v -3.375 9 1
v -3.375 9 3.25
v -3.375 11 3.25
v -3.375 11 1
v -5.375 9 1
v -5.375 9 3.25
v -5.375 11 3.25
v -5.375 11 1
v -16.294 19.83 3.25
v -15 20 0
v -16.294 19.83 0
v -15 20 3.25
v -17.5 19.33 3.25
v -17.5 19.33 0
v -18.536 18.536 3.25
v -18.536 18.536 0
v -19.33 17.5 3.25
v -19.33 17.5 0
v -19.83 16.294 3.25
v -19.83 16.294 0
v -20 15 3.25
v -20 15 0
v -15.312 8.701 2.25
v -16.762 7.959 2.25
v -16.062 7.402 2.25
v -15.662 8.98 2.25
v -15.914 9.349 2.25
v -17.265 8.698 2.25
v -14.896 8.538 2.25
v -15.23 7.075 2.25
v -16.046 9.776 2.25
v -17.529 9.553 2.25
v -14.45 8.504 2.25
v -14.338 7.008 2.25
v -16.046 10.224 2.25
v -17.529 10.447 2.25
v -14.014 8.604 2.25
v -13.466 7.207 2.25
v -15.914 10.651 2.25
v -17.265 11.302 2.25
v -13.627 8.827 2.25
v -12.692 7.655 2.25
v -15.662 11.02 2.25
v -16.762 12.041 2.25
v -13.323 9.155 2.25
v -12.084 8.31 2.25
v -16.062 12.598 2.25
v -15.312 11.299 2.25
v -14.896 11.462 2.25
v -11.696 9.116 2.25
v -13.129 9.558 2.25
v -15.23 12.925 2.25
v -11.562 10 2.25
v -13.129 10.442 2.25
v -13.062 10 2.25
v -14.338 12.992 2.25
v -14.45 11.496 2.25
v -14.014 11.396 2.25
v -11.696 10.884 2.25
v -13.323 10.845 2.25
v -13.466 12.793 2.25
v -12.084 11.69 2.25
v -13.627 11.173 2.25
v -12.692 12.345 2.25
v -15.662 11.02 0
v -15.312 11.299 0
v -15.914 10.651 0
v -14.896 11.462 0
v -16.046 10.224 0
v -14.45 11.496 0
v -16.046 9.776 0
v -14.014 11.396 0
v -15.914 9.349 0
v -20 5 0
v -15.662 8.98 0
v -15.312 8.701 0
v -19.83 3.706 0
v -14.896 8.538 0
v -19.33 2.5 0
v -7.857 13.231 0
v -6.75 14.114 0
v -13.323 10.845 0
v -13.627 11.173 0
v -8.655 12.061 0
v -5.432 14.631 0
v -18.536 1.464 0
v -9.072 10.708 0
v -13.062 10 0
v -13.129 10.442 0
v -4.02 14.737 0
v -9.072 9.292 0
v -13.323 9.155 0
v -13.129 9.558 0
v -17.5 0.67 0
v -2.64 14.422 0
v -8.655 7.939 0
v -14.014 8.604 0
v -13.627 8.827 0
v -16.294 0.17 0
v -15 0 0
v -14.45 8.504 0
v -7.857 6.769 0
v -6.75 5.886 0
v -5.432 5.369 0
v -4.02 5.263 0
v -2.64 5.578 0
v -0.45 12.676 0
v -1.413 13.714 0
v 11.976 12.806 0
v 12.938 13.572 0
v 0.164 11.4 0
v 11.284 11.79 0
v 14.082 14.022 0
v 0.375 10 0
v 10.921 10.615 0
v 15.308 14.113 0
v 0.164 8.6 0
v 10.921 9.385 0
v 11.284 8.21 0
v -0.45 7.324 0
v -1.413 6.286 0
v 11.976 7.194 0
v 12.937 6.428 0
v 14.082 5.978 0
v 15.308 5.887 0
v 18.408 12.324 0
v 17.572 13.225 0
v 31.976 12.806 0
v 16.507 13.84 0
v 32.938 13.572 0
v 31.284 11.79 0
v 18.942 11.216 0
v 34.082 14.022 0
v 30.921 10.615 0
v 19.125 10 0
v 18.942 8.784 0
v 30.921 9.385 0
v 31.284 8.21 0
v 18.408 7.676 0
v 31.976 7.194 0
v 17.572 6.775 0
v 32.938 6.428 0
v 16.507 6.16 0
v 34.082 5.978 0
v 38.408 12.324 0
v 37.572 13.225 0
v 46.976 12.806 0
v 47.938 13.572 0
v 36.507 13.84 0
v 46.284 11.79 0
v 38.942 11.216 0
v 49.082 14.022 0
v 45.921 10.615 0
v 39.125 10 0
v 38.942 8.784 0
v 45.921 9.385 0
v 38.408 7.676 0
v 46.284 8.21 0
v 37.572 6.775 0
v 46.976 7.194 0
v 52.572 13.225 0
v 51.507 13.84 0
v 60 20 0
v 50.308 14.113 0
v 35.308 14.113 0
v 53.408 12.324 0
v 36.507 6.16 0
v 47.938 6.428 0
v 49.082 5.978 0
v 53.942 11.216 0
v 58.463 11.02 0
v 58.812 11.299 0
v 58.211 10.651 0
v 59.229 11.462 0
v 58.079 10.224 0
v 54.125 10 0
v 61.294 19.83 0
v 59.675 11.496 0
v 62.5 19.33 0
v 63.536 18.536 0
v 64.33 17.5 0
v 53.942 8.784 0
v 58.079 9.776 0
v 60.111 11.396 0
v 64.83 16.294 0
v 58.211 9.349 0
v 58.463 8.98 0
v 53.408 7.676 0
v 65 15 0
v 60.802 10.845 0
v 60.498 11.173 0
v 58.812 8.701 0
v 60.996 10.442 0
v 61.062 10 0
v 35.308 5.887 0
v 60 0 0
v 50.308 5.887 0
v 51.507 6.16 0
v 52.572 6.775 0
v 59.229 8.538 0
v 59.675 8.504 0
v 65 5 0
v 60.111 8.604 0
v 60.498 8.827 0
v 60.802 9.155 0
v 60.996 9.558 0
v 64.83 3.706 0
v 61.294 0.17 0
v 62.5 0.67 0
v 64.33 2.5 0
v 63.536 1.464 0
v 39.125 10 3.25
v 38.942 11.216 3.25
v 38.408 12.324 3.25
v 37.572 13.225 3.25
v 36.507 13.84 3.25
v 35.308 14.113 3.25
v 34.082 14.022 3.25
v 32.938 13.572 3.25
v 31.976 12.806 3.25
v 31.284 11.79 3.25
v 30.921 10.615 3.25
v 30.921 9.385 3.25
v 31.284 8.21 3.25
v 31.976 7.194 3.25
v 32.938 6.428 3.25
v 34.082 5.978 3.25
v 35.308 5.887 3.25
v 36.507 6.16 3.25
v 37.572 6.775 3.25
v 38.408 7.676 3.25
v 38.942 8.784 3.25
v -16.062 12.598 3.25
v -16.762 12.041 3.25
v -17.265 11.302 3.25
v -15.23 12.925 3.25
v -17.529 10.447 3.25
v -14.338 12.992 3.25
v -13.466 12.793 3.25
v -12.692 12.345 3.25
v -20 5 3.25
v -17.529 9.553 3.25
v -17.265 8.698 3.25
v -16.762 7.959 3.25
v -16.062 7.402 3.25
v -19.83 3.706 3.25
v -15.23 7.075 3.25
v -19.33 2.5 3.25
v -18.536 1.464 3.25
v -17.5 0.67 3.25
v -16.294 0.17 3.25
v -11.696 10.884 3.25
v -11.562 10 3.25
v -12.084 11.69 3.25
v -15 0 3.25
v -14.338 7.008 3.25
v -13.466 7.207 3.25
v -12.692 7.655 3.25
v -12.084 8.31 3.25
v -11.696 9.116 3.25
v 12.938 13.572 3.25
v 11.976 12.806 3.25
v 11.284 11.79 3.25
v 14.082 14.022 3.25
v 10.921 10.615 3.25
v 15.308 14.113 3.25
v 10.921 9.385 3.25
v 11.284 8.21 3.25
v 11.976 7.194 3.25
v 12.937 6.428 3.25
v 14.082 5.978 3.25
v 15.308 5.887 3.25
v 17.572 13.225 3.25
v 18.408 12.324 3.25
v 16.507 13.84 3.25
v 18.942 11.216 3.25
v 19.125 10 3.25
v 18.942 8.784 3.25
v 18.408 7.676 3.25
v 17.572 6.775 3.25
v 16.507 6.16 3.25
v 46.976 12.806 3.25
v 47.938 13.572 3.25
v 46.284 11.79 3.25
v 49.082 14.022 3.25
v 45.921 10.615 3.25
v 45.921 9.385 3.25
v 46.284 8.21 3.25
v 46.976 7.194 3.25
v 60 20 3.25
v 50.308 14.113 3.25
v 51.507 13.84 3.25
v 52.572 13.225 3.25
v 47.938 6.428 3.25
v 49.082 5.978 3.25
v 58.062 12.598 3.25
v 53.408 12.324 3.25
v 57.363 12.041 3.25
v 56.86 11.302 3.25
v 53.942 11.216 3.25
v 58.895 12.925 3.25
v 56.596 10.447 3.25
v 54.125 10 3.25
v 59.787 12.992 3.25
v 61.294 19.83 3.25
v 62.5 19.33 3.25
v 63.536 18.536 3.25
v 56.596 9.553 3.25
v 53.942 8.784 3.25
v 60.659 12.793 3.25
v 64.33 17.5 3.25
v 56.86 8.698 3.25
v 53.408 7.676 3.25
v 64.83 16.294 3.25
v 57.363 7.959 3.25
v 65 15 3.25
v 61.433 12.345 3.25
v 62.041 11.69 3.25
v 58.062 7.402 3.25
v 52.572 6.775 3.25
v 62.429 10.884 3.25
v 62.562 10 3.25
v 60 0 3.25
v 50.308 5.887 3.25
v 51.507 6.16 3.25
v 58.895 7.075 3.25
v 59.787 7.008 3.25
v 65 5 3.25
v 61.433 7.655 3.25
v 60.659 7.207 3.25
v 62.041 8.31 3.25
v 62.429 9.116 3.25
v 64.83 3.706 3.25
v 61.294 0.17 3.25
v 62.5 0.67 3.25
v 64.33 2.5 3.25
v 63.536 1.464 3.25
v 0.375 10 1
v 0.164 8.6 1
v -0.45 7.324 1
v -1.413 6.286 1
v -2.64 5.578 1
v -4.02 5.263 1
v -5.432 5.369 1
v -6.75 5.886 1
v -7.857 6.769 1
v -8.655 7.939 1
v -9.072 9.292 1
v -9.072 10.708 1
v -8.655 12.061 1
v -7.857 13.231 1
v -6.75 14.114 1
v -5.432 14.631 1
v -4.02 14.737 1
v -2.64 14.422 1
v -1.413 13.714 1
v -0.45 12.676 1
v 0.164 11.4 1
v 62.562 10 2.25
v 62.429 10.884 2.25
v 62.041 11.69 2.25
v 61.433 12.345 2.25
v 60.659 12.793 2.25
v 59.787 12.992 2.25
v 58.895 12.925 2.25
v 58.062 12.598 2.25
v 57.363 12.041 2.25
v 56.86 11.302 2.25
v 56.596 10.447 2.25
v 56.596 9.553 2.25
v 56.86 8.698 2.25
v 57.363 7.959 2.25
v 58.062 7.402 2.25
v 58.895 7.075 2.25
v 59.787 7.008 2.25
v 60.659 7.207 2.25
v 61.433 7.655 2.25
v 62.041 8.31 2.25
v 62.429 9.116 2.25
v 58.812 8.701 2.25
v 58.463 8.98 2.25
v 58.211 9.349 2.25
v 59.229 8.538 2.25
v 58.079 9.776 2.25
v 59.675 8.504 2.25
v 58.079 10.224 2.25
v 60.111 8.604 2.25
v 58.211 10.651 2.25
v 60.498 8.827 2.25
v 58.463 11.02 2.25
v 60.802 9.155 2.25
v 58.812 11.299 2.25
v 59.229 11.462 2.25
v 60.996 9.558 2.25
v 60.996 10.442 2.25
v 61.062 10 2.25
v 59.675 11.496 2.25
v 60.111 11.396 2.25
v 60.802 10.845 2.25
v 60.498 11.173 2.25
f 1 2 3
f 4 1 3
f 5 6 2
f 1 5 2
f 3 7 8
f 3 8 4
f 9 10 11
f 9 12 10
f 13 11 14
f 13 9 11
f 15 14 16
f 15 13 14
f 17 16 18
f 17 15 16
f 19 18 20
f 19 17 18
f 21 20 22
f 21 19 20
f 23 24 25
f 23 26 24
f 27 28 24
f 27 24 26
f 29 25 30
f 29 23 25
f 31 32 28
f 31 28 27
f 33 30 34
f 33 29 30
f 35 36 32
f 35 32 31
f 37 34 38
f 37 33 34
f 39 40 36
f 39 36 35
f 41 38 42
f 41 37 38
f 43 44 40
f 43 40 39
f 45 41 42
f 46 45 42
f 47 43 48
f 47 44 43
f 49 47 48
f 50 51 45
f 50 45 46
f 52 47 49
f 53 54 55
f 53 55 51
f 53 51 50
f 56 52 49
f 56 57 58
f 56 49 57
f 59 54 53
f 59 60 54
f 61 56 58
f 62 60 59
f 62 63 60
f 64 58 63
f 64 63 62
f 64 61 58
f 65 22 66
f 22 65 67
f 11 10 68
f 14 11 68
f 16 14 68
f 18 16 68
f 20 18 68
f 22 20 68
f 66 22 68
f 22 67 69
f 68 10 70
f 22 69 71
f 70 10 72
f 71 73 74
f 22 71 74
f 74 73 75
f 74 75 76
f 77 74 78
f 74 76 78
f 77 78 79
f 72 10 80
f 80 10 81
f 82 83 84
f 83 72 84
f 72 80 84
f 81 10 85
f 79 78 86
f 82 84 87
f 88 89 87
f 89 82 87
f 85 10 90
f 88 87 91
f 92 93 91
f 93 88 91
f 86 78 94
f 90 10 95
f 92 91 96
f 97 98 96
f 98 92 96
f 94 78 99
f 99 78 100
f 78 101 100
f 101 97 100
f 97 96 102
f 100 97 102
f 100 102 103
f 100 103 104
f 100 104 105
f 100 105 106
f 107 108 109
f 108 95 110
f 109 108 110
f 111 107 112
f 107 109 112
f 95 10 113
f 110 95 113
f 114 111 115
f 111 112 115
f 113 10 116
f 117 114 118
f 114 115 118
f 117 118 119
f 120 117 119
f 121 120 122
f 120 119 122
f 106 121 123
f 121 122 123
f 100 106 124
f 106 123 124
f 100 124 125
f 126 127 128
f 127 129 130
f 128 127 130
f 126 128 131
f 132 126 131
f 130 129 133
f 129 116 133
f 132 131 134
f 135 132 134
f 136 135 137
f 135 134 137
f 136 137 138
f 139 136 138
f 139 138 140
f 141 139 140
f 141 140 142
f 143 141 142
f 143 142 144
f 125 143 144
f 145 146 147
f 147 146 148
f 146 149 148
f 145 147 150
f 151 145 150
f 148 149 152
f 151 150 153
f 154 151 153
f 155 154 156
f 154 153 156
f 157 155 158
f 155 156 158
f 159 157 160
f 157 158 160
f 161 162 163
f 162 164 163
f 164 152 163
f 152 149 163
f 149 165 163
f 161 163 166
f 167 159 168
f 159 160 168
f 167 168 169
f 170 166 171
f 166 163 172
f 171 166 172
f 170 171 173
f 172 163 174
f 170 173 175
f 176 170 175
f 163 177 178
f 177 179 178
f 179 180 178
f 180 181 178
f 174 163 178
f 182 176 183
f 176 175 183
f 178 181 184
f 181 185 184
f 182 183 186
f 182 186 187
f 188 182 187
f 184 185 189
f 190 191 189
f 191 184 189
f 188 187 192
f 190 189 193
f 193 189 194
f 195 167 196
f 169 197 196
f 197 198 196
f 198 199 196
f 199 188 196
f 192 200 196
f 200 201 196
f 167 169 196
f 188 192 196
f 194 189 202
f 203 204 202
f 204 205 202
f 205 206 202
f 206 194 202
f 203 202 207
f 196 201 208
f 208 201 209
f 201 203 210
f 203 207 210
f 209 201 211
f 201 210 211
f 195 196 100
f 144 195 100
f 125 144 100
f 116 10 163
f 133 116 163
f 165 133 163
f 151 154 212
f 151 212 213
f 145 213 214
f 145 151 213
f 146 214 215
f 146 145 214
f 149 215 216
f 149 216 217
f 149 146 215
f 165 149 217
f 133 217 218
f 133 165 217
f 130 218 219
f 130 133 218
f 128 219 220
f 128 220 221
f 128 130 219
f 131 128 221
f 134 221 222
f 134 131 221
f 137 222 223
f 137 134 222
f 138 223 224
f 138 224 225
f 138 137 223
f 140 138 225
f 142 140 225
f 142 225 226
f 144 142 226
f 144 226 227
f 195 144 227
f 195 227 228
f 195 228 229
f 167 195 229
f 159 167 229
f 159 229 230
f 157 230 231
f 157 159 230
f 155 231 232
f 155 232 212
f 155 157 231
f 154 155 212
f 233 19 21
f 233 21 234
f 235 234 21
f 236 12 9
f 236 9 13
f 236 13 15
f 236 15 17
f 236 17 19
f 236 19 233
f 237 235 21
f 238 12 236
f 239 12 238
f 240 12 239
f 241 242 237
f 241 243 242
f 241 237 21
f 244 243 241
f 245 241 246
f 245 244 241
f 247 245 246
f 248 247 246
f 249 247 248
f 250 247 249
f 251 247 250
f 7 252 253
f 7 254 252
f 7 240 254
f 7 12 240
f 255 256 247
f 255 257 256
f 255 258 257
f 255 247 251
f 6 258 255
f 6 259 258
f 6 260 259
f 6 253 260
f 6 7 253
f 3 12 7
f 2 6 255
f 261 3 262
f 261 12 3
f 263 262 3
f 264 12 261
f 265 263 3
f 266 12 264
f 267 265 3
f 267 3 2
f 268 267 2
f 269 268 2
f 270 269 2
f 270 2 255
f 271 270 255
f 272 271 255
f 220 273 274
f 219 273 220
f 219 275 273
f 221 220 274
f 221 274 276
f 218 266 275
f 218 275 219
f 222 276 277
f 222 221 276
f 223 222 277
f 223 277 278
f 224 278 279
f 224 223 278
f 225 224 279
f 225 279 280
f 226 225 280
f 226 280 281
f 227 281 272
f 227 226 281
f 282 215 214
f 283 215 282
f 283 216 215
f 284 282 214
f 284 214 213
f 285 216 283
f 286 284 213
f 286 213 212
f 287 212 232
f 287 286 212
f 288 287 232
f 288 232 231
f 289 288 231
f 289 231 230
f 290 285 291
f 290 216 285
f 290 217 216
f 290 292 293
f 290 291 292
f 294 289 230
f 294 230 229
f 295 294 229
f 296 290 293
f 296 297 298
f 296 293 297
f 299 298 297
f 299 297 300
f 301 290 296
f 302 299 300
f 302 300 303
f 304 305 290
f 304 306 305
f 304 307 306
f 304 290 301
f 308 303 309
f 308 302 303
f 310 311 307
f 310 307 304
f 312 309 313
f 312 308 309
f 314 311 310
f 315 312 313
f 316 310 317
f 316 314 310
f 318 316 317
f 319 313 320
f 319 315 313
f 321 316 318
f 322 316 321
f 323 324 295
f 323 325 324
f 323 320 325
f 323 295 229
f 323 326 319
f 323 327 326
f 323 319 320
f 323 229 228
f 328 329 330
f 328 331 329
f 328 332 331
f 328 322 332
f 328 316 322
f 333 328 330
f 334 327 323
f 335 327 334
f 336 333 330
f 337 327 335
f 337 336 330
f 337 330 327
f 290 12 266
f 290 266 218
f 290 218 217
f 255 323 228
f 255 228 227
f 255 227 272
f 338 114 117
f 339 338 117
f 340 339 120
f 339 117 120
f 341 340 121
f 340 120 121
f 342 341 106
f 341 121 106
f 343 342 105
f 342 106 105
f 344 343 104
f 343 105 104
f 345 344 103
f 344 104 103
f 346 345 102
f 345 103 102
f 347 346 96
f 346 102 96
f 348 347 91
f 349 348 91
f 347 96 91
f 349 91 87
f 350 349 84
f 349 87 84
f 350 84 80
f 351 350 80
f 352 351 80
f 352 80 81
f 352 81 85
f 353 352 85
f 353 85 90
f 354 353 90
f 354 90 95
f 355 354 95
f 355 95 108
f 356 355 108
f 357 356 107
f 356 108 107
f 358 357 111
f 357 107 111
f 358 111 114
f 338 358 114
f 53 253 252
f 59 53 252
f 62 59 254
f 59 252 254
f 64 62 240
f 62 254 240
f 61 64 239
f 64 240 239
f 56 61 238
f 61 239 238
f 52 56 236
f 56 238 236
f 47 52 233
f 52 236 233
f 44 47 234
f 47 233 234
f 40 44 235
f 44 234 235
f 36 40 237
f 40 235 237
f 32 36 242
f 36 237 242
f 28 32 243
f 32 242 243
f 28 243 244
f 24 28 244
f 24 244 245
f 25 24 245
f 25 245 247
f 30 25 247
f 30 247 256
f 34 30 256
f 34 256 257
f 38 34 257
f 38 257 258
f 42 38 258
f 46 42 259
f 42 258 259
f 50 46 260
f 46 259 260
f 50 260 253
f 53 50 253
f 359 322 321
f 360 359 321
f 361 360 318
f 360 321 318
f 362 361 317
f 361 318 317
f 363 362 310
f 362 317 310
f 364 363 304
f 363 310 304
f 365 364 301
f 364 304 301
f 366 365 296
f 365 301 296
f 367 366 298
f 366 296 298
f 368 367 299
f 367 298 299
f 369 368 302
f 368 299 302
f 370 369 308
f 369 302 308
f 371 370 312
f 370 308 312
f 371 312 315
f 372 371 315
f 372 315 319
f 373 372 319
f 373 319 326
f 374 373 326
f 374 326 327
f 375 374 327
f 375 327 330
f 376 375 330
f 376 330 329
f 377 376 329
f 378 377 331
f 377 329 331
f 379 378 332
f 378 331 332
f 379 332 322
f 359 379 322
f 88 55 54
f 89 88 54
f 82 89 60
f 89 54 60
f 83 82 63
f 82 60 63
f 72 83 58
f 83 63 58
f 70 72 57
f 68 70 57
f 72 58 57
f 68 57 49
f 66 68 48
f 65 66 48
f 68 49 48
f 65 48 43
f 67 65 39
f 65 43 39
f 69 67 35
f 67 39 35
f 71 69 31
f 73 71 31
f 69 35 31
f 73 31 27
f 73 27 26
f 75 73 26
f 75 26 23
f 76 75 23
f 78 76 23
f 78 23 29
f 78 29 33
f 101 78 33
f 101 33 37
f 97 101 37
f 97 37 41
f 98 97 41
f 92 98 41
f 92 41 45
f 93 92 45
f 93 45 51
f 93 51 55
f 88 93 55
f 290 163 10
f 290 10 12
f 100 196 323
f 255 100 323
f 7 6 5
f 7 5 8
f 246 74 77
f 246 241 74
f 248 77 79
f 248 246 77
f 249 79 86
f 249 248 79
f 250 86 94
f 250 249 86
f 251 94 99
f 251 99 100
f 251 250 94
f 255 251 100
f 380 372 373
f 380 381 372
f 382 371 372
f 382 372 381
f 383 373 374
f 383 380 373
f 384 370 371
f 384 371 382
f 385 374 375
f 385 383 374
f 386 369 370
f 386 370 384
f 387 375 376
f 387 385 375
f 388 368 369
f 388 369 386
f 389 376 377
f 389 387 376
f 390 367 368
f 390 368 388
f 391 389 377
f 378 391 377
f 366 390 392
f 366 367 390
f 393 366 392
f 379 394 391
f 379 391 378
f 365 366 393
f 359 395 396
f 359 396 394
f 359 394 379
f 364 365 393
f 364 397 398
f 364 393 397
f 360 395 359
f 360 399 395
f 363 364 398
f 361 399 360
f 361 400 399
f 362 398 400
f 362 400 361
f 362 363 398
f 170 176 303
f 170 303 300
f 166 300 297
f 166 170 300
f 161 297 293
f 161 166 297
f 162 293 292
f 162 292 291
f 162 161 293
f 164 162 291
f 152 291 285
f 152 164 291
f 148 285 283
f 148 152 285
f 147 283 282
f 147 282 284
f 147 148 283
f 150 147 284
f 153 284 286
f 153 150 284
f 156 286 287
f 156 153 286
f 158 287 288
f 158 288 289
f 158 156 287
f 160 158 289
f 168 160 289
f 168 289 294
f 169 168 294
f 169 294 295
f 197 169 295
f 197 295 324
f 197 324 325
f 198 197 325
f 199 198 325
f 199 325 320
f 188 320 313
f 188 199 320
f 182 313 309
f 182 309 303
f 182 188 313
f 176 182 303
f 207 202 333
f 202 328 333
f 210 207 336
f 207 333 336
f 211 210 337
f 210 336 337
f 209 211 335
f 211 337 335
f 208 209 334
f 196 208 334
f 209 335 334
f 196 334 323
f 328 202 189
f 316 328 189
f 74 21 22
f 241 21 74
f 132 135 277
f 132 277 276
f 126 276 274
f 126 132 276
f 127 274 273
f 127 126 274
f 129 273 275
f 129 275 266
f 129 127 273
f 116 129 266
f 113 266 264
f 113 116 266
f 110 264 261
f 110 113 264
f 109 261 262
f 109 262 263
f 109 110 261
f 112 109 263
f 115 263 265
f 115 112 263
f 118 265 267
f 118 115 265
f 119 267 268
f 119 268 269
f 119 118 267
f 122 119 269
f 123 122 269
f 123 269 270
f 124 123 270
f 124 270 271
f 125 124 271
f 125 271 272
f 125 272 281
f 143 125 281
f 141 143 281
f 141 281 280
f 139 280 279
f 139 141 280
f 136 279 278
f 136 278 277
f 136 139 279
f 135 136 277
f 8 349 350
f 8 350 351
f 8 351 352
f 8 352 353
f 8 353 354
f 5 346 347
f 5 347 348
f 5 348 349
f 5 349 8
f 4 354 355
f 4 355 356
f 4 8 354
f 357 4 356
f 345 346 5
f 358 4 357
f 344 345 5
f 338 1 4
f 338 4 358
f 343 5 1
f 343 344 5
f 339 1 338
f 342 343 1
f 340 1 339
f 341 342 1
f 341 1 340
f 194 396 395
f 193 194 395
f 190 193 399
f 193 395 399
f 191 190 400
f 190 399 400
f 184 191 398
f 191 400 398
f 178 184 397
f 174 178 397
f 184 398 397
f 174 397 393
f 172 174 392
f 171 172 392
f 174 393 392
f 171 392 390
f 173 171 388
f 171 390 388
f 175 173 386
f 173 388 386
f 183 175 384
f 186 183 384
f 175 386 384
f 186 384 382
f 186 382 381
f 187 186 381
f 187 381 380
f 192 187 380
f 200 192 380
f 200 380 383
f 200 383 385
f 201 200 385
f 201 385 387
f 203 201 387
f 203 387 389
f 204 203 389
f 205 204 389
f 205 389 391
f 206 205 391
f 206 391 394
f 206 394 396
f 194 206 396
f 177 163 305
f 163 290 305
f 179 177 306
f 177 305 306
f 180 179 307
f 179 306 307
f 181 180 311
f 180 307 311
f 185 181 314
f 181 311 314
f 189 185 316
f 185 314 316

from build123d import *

# Parameters (mm, degrees)
SKETCH_W        = 65
SKETCH_H        = 20
SKETCH_R        = 4.125
PAD_DEPTH       = 3.25
SKETCH001_W     = 20
SKETCH001_H     = 3.25
PAD001_DEPTH    = 20
SKETCH002_R     = 1.5
SKETCH002_W     = 2
SKETCH002_H     = 2
POCKET_DEPTH    = 5
FILLET_R        = 5
SKETCH003_R     = 3
POCKET001_DEPTH = 1
SKETCH004_R     = 4.75
POCKET002_DEPTH = 1


with BuildPart() as part:
    # Sketch → Pad (new body)
    with BuildSketch(Plane.XY):
        with Locations((32.5, 10)):
            Rectangle(SKETCH_W, SKETCH_H)
        with Locations((15, 10)):
            Circle(SKETCH_R, mode=Mode.SUBTRACT)
        with Locations((50, 10)):
            Circle(SKETCH_R, mode=Mode.SUBTRACT)
        with Locations((35, 10)):
            Circle(SKETCH_R, mode=Mode.SUBTRACT)
    extrude(amount=PAD_DEPTH)

    # Sketch001 (on DatumPlane) → Pad001 (join)
    with BuildSketch(Plane(origin=(0, 0, 0), x_dir=(0, -1, 0), z_dir=(-1, 0, 0))):
        with Locations((-10, 1.625)):
            Rectangle(SKETCH001_W, SKETCH001_H)
    extrude(amount=PAD001_DEPTH)

    # Sketch002 (on DatumPlane) → Pocket (cut)
    with BuildSketch(Plane.XY.offset(3.25)):
        with Locations((-14.5625, 10)):
            Circle(SKETCH002_R)
        with Locations((59.5625, 10)):
            Circle(SKETCH002_R)
        with Locations((-4.375, 10)):
            Rectangle(SKETCH002_W, SKETCH002_H)
    extrude(amount=-POCKET_DEPTH, mode=Mode.SUBTRACT)

    # Fillet
    fillet_edges = [part.edges().sort_by_distance(p)[0] for p in [
        (-20, 20, 1.625),
        (-20, 0, 1.625),
        (65, 0, 1.625),
        (65, 20, 1.625),
    ]]
    fillet(fillet_edges, radius=FILLET_R)

    # Sketch003 (on DatumPlane) → Pocket001 (cut)
    with BuildSketch(Plane.XY.offset(3.25)):
        with Locations((-14.5625, 10)):
            Circle(SKETCH003_R)
        with Locations((59.5625, 10)):
            Circle(SKETCH003_R)
    extrude(amount=-POCKET001_DEPTH, mode=Mode.SUBTRACT)

    # Sketch004 (on DatumPlane) → Pocket002 (cut)
    with BuildSketch(Plane(origin=(0, 0, 0), x_dir=(1, 0, 0), z_dir=(0, 0, -1))):
        with Locations((-4.375, -10)):
            Circle(SKETCH004_R)
    extrude(amount=-POCKET002_DEPTH, mode=Mode.SUBTRACT)


solid = part.part
